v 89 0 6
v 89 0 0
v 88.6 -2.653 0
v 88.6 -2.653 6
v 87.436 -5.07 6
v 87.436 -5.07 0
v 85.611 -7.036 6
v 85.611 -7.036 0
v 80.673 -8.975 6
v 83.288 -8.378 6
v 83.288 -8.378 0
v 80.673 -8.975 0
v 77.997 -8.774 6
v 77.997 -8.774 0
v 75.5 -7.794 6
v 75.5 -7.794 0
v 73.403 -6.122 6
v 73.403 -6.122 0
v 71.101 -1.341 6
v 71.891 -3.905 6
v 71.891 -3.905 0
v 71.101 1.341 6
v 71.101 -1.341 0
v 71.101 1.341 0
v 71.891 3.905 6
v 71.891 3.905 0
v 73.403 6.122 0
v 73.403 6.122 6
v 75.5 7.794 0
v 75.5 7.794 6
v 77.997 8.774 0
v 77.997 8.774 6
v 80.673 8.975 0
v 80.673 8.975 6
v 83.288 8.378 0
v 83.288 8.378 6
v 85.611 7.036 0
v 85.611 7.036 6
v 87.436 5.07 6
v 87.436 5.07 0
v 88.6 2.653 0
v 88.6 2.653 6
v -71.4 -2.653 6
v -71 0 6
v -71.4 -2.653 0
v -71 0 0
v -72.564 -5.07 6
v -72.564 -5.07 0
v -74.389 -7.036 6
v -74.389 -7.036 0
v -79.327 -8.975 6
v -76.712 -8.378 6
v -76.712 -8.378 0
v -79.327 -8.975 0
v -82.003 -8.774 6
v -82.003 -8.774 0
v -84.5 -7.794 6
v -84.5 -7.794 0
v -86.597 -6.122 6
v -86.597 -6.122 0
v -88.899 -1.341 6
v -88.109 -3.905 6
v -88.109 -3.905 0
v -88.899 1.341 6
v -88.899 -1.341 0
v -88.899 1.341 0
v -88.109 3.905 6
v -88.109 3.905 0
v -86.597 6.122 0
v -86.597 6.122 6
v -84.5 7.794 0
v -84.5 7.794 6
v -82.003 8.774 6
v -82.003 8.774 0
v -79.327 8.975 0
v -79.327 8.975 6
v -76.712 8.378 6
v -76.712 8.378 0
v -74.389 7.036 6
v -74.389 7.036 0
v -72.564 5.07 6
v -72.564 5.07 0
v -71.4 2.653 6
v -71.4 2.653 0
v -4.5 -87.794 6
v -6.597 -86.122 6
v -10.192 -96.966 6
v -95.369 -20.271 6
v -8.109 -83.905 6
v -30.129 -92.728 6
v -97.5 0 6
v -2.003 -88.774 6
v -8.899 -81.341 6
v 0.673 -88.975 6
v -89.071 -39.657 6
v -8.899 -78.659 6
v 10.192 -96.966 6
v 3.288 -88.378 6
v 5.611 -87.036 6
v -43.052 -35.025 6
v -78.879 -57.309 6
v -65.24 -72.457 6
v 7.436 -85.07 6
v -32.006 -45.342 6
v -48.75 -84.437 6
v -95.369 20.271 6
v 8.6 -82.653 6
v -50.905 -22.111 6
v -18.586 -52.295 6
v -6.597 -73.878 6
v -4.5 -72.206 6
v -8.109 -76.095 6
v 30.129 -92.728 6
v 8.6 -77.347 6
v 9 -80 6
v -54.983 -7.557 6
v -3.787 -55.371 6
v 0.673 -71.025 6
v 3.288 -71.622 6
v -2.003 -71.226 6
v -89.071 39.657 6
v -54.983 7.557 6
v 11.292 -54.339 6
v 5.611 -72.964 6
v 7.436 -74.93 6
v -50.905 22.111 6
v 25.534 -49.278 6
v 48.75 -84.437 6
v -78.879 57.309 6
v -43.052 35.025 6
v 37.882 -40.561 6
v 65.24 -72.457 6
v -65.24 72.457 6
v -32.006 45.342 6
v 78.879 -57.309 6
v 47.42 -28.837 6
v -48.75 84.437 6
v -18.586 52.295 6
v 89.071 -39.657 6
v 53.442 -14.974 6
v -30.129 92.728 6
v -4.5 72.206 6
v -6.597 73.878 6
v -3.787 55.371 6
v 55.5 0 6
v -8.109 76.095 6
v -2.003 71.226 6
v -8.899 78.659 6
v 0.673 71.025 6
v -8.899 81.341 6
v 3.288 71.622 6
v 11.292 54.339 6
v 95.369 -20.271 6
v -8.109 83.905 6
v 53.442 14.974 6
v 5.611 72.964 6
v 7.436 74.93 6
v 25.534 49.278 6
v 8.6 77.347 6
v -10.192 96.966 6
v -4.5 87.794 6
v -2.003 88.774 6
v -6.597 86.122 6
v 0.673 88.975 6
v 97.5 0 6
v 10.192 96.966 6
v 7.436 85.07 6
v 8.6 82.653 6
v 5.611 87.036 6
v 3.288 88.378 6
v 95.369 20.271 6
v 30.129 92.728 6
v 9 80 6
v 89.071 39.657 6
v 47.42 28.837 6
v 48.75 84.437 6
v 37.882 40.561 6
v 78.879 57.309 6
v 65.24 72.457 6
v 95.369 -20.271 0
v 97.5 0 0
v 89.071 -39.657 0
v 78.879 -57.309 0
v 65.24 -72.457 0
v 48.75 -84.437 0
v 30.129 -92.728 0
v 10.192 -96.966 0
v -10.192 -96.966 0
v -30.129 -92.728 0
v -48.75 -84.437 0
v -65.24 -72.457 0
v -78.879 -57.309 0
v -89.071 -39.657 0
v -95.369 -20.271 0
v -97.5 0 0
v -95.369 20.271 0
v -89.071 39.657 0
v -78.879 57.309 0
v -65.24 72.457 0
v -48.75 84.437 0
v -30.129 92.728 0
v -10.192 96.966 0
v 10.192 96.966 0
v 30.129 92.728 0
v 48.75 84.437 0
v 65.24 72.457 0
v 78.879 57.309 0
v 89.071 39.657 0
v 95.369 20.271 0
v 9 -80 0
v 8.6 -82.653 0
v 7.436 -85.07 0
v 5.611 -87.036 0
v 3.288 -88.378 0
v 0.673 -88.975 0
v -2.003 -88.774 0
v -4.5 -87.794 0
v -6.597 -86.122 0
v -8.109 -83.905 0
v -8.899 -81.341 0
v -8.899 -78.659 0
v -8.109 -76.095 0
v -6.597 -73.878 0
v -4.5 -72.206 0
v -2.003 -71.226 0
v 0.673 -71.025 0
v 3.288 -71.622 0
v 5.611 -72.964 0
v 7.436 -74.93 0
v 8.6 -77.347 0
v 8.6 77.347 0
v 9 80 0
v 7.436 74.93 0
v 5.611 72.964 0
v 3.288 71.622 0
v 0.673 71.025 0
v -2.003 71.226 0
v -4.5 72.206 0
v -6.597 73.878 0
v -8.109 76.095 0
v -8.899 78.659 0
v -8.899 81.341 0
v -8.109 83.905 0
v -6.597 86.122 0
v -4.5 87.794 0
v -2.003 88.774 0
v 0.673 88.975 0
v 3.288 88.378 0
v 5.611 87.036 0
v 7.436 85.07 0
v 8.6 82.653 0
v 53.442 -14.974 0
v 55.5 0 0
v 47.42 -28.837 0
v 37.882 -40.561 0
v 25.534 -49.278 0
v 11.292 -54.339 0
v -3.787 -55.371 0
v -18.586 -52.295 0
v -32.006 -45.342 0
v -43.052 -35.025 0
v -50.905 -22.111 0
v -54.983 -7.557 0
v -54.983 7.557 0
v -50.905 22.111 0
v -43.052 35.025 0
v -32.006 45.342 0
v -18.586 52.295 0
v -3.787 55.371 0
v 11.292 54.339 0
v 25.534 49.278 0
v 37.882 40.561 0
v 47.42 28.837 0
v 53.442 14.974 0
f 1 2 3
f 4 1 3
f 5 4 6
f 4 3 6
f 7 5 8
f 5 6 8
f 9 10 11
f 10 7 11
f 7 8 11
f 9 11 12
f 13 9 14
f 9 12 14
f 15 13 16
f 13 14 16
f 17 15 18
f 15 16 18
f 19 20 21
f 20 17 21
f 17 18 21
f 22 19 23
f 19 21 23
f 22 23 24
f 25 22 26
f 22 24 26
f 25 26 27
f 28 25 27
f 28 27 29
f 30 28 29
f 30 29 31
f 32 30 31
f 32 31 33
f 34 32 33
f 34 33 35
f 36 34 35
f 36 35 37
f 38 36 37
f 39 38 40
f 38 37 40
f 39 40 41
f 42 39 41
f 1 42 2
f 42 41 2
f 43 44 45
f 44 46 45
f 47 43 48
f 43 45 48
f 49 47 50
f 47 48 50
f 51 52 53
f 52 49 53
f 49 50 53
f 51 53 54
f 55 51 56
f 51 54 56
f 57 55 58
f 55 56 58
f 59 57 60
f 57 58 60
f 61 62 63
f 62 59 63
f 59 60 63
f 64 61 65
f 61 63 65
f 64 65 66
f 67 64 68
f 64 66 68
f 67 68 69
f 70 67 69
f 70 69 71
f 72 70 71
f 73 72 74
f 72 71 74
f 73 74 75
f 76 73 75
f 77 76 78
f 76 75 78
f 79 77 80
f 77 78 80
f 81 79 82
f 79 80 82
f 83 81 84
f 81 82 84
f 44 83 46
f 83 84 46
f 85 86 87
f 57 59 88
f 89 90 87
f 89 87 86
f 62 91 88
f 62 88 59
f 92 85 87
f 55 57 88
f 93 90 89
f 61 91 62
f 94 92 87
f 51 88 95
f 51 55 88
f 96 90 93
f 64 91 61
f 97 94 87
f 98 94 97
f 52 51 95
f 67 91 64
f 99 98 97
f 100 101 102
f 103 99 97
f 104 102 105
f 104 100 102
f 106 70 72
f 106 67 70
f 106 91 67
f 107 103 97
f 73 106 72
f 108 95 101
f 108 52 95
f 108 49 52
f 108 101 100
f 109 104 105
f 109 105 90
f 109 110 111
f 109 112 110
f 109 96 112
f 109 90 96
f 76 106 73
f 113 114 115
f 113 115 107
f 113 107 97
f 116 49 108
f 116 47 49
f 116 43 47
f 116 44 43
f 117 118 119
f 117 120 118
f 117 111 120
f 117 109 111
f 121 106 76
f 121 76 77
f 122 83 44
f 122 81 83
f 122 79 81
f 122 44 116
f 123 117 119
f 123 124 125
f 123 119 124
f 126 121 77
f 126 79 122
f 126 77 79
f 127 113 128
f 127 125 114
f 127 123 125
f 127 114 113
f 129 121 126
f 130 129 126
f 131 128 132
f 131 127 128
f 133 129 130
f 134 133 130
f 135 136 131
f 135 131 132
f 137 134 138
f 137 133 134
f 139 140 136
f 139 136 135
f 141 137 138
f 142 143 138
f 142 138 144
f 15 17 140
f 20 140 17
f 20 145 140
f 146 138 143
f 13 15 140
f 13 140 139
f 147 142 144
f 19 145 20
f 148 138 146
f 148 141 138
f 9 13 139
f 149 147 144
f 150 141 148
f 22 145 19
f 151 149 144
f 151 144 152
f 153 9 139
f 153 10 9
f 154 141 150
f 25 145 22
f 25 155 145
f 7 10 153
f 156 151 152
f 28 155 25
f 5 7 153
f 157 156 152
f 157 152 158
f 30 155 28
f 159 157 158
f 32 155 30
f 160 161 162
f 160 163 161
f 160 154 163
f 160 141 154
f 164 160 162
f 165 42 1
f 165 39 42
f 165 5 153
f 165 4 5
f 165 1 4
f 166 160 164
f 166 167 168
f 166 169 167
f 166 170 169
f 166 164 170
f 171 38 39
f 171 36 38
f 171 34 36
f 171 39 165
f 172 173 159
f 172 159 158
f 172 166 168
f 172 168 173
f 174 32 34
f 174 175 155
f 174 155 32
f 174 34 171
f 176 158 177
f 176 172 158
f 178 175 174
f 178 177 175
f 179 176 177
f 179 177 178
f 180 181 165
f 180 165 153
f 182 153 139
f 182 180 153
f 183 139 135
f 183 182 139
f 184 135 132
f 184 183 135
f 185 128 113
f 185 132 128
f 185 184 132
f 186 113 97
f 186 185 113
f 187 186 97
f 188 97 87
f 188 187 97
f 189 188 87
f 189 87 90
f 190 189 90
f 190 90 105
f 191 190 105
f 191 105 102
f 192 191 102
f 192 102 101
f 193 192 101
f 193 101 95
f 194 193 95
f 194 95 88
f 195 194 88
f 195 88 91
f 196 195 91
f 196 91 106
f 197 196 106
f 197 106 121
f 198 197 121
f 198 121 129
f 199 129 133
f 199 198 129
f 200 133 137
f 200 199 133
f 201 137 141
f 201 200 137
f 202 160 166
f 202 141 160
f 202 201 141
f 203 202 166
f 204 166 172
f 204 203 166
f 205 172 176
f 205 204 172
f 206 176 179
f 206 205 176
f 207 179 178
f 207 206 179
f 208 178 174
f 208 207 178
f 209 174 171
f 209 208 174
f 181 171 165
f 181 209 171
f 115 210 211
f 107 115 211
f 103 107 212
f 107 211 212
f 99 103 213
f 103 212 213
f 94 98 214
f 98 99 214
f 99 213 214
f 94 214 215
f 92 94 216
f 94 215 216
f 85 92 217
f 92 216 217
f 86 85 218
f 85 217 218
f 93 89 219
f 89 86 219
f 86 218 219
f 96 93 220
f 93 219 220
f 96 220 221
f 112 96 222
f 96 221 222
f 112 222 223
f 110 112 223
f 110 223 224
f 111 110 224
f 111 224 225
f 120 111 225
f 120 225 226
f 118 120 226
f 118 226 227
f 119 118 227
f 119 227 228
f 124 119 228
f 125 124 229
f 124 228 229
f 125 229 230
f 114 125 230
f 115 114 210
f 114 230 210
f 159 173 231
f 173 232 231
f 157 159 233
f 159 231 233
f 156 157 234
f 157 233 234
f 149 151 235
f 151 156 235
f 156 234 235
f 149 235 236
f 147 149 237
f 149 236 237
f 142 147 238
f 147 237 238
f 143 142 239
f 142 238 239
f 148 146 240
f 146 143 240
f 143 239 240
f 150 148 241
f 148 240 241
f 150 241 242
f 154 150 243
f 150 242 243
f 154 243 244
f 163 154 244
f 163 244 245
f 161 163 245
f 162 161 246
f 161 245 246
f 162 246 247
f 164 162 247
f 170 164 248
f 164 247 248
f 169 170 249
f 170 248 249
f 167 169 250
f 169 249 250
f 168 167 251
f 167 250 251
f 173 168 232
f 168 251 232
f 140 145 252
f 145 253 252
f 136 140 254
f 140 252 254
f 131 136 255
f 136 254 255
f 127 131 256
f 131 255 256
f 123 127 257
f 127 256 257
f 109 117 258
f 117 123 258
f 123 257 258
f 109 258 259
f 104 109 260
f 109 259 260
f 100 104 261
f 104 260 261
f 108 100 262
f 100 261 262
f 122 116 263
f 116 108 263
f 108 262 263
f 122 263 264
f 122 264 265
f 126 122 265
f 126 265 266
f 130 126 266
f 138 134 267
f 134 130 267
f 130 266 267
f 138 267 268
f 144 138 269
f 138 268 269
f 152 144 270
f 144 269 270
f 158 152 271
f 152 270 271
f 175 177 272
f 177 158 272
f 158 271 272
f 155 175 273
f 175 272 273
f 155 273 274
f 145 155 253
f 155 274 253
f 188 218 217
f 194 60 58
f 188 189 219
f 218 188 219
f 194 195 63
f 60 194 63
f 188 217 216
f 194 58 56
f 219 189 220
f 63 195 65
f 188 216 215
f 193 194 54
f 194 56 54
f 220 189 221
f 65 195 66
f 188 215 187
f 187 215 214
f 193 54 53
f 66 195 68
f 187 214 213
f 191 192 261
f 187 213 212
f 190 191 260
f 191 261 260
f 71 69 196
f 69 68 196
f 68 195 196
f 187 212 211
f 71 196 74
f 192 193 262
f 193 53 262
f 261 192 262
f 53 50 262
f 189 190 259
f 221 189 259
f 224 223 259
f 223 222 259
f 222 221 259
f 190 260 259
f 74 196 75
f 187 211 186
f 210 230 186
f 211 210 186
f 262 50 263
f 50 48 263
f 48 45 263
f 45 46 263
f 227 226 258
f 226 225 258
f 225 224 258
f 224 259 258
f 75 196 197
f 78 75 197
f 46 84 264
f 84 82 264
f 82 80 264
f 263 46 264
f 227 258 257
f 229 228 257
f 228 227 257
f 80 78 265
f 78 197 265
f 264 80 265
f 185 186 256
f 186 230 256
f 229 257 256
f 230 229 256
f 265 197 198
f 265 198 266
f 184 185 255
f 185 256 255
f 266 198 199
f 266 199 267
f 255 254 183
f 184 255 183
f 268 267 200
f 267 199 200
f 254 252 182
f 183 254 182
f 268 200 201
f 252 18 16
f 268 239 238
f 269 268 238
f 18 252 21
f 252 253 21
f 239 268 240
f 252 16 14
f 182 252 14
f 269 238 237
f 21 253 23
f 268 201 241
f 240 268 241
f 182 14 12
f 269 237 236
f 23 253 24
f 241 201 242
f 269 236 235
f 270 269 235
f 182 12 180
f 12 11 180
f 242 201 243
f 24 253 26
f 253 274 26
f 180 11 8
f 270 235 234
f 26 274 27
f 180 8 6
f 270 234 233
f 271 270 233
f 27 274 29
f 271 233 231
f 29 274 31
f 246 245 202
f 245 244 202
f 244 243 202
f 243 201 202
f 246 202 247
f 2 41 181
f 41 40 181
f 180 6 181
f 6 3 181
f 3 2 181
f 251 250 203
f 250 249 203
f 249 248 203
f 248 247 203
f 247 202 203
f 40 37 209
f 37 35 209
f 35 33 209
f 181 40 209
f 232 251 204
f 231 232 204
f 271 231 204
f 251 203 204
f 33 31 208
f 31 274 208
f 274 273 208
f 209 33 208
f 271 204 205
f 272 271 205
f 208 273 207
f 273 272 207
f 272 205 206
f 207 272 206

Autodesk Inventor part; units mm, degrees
ref_plane "YZ Plane" through (0, 0, 0) normal (1, 0, 0) x (0, 1, 0)
ref_plane "XZ Plane" through (0, 0, 0) normal (0, 1, 0) x (-1, 0, 0)
ref_plane "XY Plane" through (0, 0, 0) normal (0, 0, 1) x (1, 0, 0)
sketch "Sketch2" plane through (0, 0, 0) normal (0, 0, 1) x (1, 0, 0)
  circle A0 centre (0, 0) radius 55.5
  circle A1 centre (0, 0) radius 97.5
  circle A2 centre (0, 0) radius 80 construction
  circle A3 centre (0, 80) radius 9
  circle A4 centre (-80, 0) radius 9
  circle A5 centre (0, -80) radius 9
  circle A6 centre (80, 0) radius 9
  dimension "d29" = 160
  dimension "d25" = 111
  dimension "d27" = 195
  dimension "d30" = 18
  dimension "d33" = 360
extrude "Plate2" add sketch "Sketch2" along normal blind 6
equation "\"d14\" = Thickness"
equation "\"BendReliefWidth\" = Thickness"
equation "\"BendReliefDepth\" = 0.5 * Thickness"
equation "\"CornerReliefSize\" = 4 * Thickness"
equation "\"MinimumRemnant\" = 2 * Thickness"
equation "\"TransitionRadius\" = BendRadius"
equation "\"JacobiRadiusSize\" = BendRadius"
equation "\"GapSize\" = Thickness"
equation "\"Thickness\" = 6"
equation "\"BendRadius\" = 6"
properties part number "PRS 1200-31 FDS flange DN90" material "Steel"
